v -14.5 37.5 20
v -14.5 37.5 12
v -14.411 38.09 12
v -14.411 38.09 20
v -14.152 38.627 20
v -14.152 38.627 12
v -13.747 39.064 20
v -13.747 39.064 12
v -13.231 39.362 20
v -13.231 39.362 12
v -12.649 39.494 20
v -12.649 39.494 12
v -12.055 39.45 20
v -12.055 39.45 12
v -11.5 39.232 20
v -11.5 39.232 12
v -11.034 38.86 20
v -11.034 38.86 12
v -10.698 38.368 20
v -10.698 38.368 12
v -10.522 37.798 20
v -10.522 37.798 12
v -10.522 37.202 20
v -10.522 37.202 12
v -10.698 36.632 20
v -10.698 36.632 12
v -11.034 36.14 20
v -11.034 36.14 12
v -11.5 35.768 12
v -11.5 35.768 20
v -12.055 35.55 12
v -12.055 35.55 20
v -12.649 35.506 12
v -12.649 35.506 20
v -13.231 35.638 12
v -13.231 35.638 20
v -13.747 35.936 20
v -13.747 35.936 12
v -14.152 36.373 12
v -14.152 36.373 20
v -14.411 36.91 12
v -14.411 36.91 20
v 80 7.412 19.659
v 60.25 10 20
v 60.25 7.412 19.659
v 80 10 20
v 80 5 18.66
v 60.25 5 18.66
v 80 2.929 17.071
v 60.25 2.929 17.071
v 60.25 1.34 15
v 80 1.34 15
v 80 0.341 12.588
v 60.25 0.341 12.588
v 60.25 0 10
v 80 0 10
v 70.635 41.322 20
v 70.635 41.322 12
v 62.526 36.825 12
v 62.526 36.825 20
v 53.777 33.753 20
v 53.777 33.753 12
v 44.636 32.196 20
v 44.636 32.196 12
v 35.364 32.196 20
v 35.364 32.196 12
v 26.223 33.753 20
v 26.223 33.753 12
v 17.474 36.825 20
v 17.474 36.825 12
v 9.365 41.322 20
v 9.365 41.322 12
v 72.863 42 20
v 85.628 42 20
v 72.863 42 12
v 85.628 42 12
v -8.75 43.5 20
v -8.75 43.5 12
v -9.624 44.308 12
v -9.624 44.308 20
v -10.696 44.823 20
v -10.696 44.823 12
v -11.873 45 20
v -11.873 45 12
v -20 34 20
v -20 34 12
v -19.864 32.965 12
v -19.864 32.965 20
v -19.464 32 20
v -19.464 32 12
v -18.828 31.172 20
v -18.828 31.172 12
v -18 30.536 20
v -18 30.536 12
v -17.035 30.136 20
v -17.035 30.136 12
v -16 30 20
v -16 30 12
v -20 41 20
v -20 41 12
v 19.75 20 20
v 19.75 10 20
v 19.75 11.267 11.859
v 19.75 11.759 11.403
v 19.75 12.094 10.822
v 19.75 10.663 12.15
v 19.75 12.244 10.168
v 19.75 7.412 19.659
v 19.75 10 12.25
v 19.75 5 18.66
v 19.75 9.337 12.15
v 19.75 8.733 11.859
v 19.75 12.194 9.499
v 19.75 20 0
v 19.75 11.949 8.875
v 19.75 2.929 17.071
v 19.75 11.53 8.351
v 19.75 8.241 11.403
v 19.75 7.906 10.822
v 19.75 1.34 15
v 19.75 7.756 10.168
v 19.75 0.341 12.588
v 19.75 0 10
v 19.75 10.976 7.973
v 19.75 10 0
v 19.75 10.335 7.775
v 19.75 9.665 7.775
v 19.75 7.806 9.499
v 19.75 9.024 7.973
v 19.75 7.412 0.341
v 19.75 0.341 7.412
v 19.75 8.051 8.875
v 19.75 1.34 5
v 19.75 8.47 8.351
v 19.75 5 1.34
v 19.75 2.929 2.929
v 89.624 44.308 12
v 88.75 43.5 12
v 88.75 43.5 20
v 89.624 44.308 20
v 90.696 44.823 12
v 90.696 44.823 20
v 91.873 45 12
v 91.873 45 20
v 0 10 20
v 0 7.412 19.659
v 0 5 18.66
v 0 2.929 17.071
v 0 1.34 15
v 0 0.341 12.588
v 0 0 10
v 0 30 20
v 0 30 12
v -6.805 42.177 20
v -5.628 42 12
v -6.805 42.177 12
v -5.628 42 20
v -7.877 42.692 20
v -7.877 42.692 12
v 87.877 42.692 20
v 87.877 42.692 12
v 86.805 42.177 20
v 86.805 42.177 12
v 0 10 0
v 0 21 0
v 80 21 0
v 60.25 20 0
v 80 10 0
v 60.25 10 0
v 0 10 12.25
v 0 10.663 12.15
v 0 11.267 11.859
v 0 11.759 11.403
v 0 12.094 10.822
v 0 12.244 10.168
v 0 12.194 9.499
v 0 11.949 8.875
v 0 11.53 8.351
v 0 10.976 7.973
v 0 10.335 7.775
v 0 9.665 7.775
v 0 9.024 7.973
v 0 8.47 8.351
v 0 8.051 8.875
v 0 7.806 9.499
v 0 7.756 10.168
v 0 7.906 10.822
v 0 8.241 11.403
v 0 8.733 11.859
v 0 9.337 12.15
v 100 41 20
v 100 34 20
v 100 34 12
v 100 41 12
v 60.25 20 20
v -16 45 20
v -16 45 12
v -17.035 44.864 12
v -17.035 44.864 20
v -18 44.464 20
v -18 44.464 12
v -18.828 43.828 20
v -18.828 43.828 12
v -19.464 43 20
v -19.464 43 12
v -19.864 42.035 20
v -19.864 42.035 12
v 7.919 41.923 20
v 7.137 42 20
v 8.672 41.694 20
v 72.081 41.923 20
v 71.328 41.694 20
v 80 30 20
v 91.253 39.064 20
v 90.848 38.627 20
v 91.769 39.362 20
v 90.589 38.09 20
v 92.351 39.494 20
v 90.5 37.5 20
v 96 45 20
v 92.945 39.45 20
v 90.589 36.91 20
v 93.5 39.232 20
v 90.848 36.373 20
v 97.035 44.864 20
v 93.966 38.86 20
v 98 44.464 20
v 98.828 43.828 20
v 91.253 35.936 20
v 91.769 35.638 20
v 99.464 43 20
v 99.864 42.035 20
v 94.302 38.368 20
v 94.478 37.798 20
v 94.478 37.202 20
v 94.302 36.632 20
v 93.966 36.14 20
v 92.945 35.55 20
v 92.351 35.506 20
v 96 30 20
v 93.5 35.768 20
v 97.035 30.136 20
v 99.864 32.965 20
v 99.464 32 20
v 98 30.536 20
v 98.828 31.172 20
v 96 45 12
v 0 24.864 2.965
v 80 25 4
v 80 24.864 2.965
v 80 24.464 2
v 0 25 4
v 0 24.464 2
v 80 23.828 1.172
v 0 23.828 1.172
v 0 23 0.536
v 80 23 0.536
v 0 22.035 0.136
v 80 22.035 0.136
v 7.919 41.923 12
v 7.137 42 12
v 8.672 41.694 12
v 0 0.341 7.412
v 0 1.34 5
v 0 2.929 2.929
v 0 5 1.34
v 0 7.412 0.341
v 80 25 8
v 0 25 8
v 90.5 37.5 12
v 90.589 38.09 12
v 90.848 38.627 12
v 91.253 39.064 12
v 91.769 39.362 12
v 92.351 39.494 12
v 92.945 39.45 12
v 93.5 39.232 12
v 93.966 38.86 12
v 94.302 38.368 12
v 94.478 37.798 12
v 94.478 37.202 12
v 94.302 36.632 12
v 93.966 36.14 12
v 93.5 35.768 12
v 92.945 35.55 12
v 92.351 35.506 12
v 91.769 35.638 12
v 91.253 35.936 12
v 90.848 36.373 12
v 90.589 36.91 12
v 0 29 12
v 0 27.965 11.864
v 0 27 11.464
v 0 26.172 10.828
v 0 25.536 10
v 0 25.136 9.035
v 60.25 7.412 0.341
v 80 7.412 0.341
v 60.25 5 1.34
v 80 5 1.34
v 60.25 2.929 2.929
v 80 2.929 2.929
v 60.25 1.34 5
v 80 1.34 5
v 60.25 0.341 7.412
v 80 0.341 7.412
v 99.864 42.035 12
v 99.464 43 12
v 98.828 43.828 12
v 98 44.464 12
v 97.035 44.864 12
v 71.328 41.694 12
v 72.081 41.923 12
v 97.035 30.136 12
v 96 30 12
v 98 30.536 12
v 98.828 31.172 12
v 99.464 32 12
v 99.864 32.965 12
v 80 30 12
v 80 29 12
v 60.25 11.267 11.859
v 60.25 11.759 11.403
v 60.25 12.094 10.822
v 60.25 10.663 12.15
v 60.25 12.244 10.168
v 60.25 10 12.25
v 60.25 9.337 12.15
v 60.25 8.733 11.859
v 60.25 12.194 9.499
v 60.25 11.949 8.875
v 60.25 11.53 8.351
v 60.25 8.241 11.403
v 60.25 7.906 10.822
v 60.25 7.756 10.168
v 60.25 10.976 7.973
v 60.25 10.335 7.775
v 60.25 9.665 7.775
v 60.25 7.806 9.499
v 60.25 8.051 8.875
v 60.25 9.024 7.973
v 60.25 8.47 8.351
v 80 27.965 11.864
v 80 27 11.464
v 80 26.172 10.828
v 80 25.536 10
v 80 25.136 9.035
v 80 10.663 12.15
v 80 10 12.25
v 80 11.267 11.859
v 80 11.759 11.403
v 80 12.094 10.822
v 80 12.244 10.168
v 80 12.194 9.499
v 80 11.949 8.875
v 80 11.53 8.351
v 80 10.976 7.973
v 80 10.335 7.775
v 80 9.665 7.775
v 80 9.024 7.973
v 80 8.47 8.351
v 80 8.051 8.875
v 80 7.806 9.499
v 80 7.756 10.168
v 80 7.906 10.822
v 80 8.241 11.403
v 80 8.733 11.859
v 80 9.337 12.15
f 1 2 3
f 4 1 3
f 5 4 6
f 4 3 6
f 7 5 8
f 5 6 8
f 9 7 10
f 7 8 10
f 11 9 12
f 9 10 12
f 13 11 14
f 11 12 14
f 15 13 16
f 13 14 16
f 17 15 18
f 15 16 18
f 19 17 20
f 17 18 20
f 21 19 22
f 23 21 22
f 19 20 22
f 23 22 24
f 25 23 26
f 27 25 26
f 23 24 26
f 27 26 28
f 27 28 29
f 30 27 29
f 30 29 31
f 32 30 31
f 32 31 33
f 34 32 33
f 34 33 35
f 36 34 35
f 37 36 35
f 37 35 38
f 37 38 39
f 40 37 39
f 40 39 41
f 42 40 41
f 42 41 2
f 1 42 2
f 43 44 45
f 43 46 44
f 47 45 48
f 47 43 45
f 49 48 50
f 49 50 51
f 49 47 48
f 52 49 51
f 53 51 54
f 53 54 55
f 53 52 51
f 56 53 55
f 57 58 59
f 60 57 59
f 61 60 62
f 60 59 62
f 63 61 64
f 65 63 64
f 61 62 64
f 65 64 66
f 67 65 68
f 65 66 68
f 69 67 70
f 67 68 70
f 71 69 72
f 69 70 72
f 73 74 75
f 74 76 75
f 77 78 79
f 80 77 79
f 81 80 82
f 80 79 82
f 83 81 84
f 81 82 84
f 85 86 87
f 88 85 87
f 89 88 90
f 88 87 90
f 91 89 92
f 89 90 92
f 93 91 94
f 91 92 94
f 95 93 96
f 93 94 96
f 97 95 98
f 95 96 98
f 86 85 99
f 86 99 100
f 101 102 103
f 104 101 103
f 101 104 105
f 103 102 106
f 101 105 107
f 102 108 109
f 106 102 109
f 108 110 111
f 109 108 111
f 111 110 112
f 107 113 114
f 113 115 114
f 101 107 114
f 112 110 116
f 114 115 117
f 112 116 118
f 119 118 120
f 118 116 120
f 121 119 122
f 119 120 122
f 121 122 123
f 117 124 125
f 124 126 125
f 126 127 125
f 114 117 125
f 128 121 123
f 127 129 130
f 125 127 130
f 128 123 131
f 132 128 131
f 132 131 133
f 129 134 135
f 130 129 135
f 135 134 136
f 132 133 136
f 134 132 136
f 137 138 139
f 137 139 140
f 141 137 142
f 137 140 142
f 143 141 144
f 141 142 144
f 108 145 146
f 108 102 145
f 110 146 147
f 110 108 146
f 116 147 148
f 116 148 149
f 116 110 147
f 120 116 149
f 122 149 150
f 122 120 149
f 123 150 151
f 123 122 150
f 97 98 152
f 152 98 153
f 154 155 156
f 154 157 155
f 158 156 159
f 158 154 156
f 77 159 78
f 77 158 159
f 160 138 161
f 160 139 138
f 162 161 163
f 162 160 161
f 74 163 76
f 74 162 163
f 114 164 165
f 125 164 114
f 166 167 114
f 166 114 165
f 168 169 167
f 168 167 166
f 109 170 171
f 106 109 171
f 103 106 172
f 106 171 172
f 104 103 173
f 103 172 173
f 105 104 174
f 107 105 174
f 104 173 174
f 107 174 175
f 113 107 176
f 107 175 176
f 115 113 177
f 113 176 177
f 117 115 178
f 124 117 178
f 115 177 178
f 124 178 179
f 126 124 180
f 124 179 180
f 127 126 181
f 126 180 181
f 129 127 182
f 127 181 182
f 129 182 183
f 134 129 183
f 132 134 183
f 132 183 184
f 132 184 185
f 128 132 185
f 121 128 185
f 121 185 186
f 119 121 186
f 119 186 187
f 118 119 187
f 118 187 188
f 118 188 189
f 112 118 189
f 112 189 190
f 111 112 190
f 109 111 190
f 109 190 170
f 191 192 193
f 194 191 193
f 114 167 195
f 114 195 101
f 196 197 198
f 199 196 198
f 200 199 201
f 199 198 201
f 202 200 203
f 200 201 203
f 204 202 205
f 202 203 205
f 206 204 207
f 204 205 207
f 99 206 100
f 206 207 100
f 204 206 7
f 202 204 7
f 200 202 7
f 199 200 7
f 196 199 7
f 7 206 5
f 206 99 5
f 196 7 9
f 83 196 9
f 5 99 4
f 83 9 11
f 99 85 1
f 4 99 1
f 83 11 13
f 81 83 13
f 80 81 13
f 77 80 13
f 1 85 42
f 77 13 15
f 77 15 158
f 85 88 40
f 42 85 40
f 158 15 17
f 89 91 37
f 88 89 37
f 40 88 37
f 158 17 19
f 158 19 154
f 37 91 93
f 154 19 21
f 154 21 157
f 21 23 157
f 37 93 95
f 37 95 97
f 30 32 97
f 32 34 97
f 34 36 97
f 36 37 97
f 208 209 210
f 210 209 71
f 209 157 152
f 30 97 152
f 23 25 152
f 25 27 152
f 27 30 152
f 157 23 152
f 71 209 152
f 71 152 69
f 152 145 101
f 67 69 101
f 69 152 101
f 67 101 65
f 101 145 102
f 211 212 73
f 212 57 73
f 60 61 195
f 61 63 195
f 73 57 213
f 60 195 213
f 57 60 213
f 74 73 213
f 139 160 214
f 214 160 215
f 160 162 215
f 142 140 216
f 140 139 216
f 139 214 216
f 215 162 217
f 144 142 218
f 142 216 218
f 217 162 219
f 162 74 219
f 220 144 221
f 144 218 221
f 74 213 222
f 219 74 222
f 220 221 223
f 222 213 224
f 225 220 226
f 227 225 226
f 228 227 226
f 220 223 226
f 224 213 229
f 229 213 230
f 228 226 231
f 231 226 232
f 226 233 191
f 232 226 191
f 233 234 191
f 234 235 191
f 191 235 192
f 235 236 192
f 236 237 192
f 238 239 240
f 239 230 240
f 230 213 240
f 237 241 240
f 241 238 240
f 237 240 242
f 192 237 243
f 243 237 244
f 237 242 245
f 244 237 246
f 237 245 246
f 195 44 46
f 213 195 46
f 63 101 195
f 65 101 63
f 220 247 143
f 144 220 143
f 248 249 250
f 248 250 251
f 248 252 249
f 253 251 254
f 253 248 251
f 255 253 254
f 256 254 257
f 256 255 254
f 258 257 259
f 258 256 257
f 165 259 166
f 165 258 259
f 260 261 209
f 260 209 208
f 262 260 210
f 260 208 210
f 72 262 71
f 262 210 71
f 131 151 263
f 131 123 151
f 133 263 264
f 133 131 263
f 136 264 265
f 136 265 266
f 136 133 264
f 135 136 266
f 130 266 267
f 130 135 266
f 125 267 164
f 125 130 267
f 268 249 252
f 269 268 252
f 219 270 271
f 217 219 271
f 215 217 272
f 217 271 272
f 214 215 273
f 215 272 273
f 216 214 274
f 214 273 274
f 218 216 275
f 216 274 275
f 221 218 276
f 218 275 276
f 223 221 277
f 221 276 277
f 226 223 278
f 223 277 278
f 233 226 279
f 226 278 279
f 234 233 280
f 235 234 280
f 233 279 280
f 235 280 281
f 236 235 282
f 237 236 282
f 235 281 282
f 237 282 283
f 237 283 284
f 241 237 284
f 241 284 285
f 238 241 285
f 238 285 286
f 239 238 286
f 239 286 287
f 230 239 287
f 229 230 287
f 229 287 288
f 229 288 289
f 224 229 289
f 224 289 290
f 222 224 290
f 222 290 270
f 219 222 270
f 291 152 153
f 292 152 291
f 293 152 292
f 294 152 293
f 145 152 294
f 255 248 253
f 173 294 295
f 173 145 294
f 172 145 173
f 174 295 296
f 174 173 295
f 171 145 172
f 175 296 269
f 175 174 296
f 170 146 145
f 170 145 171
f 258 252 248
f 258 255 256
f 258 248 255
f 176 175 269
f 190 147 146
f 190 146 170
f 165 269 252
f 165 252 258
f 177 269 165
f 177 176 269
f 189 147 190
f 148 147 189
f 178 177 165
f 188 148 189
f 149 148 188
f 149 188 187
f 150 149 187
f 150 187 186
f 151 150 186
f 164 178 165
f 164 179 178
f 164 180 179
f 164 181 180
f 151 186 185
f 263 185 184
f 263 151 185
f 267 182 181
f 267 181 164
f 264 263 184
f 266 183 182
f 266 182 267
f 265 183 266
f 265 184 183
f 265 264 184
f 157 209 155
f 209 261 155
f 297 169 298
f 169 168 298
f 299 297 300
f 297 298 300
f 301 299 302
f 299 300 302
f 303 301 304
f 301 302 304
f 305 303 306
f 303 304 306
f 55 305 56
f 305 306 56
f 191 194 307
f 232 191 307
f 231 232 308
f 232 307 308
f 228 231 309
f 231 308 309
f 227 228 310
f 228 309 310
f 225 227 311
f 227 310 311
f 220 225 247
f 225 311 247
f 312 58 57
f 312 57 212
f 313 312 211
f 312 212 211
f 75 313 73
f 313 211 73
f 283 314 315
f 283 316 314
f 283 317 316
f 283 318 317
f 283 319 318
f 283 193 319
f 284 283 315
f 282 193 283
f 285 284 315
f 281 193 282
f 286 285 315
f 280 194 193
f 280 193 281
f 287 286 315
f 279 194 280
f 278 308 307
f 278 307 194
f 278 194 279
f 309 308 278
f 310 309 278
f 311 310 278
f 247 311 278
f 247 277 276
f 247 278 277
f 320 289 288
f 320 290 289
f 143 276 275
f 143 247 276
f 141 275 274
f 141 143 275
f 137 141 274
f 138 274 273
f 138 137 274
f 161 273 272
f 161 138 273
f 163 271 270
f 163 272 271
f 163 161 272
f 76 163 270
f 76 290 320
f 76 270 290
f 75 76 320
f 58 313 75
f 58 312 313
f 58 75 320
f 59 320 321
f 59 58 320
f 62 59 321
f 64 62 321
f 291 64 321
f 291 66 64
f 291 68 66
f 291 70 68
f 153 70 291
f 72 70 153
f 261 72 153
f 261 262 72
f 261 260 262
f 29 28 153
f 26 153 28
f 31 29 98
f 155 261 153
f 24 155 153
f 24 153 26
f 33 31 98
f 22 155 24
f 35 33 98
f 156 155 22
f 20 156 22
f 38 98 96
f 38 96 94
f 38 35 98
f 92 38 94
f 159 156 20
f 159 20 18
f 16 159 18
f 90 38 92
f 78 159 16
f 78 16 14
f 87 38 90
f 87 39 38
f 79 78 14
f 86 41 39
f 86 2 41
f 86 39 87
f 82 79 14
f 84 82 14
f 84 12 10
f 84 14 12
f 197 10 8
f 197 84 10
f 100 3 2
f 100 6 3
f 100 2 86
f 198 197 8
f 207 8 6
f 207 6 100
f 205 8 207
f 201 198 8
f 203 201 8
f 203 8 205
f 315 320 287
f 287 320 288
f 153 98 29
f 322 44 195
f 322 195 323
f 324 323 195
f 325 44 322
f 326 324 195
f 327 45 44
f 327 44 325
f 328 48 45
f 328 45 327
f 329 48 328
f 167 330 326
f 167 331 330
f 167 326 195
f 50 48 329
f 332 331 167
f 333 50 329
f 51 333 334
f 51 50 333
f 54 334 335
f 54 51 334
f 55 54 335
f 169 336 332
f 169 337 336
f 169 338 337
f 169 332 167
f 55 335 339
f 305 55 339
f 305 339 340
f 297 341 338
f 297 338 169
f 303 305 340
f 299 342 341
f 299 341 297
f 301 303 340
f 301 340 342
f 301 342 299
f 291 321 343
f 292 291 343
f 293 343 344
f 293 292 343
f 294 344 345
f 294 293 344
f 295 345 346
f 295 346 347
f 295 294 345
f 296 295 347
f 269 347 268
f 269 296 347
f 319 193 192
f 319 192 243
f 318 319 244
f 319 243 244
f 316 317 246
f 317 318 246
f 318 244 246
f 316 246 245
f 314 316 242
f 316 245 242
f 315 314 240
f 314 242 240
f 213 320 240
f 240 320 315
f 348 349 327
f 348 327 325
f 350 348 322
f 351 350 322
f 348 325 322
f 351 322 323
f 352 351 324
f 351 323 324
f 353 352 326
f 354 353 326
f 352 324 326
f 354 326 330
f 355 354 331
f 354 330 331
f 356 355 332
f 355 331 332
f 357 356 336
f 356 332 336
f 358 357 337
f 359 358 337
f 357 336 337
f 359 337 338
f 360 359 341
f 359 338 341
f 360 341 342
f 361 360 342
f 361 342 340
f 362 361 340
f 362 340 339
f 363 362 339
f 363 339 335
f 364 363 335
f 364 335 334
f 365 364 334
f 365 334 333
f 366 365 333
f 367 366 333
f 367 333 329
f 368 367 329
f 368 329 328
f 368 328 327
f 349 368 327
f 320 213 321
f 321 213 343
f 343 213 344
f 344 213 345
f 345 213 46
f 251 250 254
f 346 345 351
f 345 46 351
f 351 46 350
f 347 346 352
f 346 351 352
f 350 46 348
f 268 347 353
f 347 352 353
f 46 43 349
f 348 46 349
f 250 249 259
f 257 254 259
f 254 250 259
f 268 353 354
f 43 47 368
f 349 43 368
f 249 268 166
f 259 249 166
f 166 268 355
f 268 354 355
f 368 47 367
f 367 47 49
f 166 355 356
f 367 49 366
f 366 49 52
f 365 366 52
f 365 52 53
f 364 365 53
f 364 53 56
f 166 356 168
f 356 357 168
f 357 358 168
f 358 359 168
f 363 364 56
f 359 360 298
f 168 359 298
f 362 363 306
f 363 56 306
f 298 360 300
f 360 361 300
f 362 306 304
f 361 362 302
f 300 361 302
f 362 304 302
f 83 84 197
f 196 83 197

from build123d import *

# Parameters (mm, degrees)
SKETCH1_W           = 80
SKETCH1_H           = 20
BOSS_EXTRUDE1_DEPTH = 30
SKETCH2_W           = 40.5
SKETCH2_H           = 20
CUT_EXTRUDE1_DEPTH  = 20
SKETCH3_R           = 2.25
CUT_EXTRUDE2_DEPTH  = 88.749643874
FILLET1_R           = 10
SKETCH4_W           = 120
SKETCH4_H           = 20
BOSS_EXTRUDE2_DEPTH = 120
SKETCH7_R           = 2
SKETCH7_W           = 96
SKETCH7_H           = 96
CUT_EXTRUDE5_DEPTH  = 182.383571472
SKETCH8_W           = 120
SKETCH8_H           = 125
CUT_EXTRUDE6_DEPTH  = 12
FILLET2_R           = 4
FILLET3_R           = 4
SKETCH10_W          = 120
SKETCH10_H          = 105
CUT_EXTRUDE7_DEPTH  = 181.676506497
SKETCH11_R          = 55
CUT_EXTRUDE8_DEPTH  = 111.313190508
FILLET6_R           = 4
FILLET7_R           = 4


# Some blends are built 0.0001 mm under size
with BuildPart() as part:
    # Sketch1 → Boss-Extrude1 (new body)
    with BuildSketch(Plane(origin=(0, 0, 0), x_dir=(1, 0, 0), z_dir=(0, 1, 0))):
        with Locations((40, -10)):
            Rectangle(SKETCH1_W, SKETCH1_H)
    extrude(amount=BOSS_EXTRUDE1_DEPTH)

    # Sketch2 → Cut-Extrude1 (cut)
    with BuildSketch(Plane(origin=(0, 0, 0), x_dir=(-1, 0, 0), z_dir=(0, -1, 0))):
        with Locations((-40, -10)):
            Rectangle(SKETCH2_W, SKETCH2_H)
    extrude(amount=-CUT_EXTRUDE1_DEPTH, mode=Mode.SUBTRACT)

    # Sketch3 → Cut-Extrude2 (cut, through all)
    with BuildSketch(Plane.ZY):
        with Locations((10, 10)):
            Circle(SKETCH3_R)
    extrude(amount=-CUT_EXTRUDE2_DEPTH, mode=Mode.SUBTRACT)

    # Fillet1
    fillet1_edges = [part.edges().sort_by_distance(p)[0] for p in [
        (70.125, 0, 20),
        (70.125, 0, 0),
        (9.875, 0, 20),
        (9.875, 0, 0),
    ]]
    fillet(fillet1_edges, radius=FILLET1_R - 0.0001)  # a hair under: the kernel refuses the full size

    # Sketch4 → Boss-Extrude2 (add)
    with BuildSketch(Plane(origin=(0, 30, 0), x_dir=(1, 0, 0), z_dir=(0, 1, 0))):
        with Locations((40, -10)):
            Rectangle(SKETCH4_W, SKETCH4_H)
    extrude(amount=BOSS_EXTRUDE2_DEPTH)

    # Sketch7 → Cut-Extrude5 (cut, through all)
    with BuildSketch(Plane(origin=(0, 0, 0), x_dir=(-1, 0, 0), z_dir=(0, 0, -1))):
        with Locations((-92.5, 37.5)):
            Circle(SKETCH7_R)
        with Locations((12.5, 37.5)):
            Circle(SKETCH7_R)
        with Locations((12.5, 142.5)):
            Circle(SKETCH7_R)
        with Locations((-92.5, 142.5)):
            Circle(SKETCH7_R)
        with Locations((-40, 90)):
            Rectangle(SKETCH7_W, SKETCH7_H)
    extrude(amount=-CUT_EXTRUDE5_DEPTH, mode=Mode.SUBTRACT)

    # Sketch8 → Cut-Extrude6 (cut)
    with BuildSketch(Plane(origin=(0, 0, 0), x_dir=(-1, 0, 0), z_dir=(0, 0, -1))):
        with Locations((-40, 87.5)):
            Rectangle(SKETCH8_W, SKETCH8_H)
    extrude(amount=-CUT_EXTRUDE6_DEPTH, mode=Mode.SUBTRACT)

    # Fillet2
    fillet2_edges = [part.edges().sort_by_distance(p)[0] for p in [
        (40, 25, 12),
    ]]
    fillet(fillet2_edges, radius=FILLET2_R)

    # Fillet3
    fillet3_edges = [part.edges().sort_by_distance(p)[0] for p in [
        (40, 25, 0),
    ]]
    fillet(fillet3_edges, radius=FILLET3_R)

    # Sketch10 → Cut-Extrude7 (cut, through all)
    with BuildSketch(Plane(origin=(0, 0, 12), x_dir=(-1, 0, 0), z_dir=(0, 0, -1))):
        with Locations((-40, 97.5)):
            Rectangle(SKETCH10_W, SKETCH10_H)
    extrude(amount=-CUT_EXTRUDE7_DEPTH, mode=Mode.SUBTRACT)

    # Sketch11 → Cut-Extrude8 (cut, through all)
    with BuildSketch(Plane(origin=(0, 0, 12), x_dir=(-1, 0, 0), z_dir=(0, 0, -1))):
        with Locations((-40, 87)):
            Circle(SKETCH11_R)
    extrude(amount=-CUT_EXTRUDE8_DEPTH, mode=Mode.SUBTRACT)

    # Fillet6
    # the kernel refuses this fillet: 4 mm, written as the material it takes off along each edge
    with BuildSketch(Plane(origin=(-20, 30, 2), x_dir=(0, 1, 0), z_dir=(0, 0, 1)), Plane(origin=(100, 45, 2), x_dir=(0, -1, 0), z_dir=(0, 0, 1)), Plane(origin=(-20, 45, 2), x_dir=(1, 0, 0), z_dir=(0, 0, 1))) as fillet6_piece_1:
        with BuildLine():
            CenterArc((FILLET6_R, -FILLET6_R), FILLET6_R, 90, 90)
            Line((0, -FILLET6_R), (-FILLET6_R * 0.02, -FILLET6_R))
            Line((-FILLET6_R * 0.02, -FILLET6_R), (-FILLET6_R * 0.02, FILLET6_R * 0.02))
            Line((-FILLET6_R * 0.02, FILLET6_R * 0.02), (FILLET6_R, FILLET6_R * 0.02))
            Line((FILLET6_R, FILLET6_R * 0.02), (FILLET6_R, 0))
        make_face()
    extrude(amount=28, mode=Mode.SUBTRACT)
    with BuildSketch(Plane(origin=(100, 30, 30), x_dir=(-1, 0, 0), z_dir=(0, 0, -1))) as fillet6_piece_2:
        with BuildLine():
            CenterArc((FILLET6_R, FILLET6_R), FILLET6_R, 180, 90)
            Line((0, FILLET6_R), (-FILLET6_R * 0.02, FILLET6_R))
            Line((-FILLET6_R * 0.02, FILLET6_R), (-FILLET6_R * 0.02, -FILLET6_R * 0.02))
            Line((-FILLET6_R * 0.02, -FILLET6_R * 0.02), (FILLET6_R, -FILLET6_R * 0.02))
            Line((FILLET6_R, -FILLET6_R * 0.02), (FILLET6_R, 0))
        make_face()
    extrude(amount=28, mode=Mode.SUBTRACT)
    with BuildSketch(Plane(origin=(88, 45, 29.682458366), x_dir=(1, 0, 0), z_dir=(0, 0, -1))) as fillet6_piece_3:
        with BuildLine():
            CenterArc((3.872983346, 4), FILLET6_R, 194.477512186, 75.522487814)
            Line((0, 3), (-0.077459667, 2.98))
            ThreePointArc((-0.077459667, 2.98), (-0.08, 1.5), (-0.08, 0))
            Line((-0.08, 0), (0, -0.08))
            Line((0, -0.08), (3.872983346, -0.08))
            Line((3.872983346, -0.08), (3.872983346, 0))
        make_face()
    extrude(amount=27.364916731, mode=Mode.SUBTRACT)
    with BuildSketch(Plane(origin=(71.622776602, 42, 23.101442122), x_dir=(1, 0, 0), z_dir=(0, 0, -1))) as fillet6_piece_4:
        with BuildLine():
            CenterArc((1.240576849, 4), FILLET6_R, 236.151006115, 33.848993885)
            Line((-0.987447114, 0.677966102), (-1.032007593, 0.611525424))
            ThreePointArc((-1.032007593, 0.611525424), (-0.537159223, 0.275719676), (-0.045996766, -0.065454545))
            Line((-0.045996766, -0.065454545), (0, -0.08))
            Line((0, -0.08), (1.240576849, -0.08))
            Line((1.240576849, -0.08), (1.240576849, 0))
        make_face()
    extrude(amount=14.202884243, mode=Mode.SUBTRACT)
    with BuildSketch(Plane(origin=(8.377223398, 42, 23.101442122), x_dir=(0.8243940217834806, -0.5660163397355751, 0), z_dir=(0, 0, -1))) as fillet6_piece_5:
        with BuildLine():
            CenterArc((1.241341221, 3.999762854), FILLET6_R, 235.527102444, 33.848993885)
            Line((-1.022724138, 0.702186767), (-1.068005445, 0.636235245))
            Line((-1.068005445, 0.636235245), (-0.045281307, -0.065951522))
            Line((-0.045281307, -0.065951522), (0.000871117, -0.079995257))
            ThreePointArc((0.000871117, -0.079995257), (0.598892695, -0.076739245), (1.196914272, -0.079995257))
            Line((1.196914272, -0.079995257), (1.197785389, 0))
        make_face()
    extrude(amount=14.202884243, mode=Mode.SUBTRACT)
    with BuildSketch(Plane(origin=(-8, 45, 2.317541634), x_dir=(0, -1, 0), z_dir=(0, 0, 1))) as fillet6_piece_6:
        with BuildLine():
            CenterArc((4, -3.872983346), FILLET6_R, 104.477512186, 75.522487814)
            Line((0, -3.872983346), (-0.08, -3.872983346))
            Line((-0.08, -3.872983346), (-0.08, 0))
            Line((-0.08, 0), (0, 0.08))
            ThreePointArc((0, 0.08), (1.5, 0.08), (2.98, 0.077459667))
            Line((2.98, 0.077459667), (3, 0))
        make_face()
    extrude(amount=27.364916731, mode=Mode.SUBTRACT)

    # Fillet7
    fillet7_edges = [part.edges().sort_by_distance(p)[0] for p in [
        (88, 42, 16),
        (-8, 42, 16),
    ]]
    fillet(fillet7_edges, radius=FILLET7_R)


solid = part.part
